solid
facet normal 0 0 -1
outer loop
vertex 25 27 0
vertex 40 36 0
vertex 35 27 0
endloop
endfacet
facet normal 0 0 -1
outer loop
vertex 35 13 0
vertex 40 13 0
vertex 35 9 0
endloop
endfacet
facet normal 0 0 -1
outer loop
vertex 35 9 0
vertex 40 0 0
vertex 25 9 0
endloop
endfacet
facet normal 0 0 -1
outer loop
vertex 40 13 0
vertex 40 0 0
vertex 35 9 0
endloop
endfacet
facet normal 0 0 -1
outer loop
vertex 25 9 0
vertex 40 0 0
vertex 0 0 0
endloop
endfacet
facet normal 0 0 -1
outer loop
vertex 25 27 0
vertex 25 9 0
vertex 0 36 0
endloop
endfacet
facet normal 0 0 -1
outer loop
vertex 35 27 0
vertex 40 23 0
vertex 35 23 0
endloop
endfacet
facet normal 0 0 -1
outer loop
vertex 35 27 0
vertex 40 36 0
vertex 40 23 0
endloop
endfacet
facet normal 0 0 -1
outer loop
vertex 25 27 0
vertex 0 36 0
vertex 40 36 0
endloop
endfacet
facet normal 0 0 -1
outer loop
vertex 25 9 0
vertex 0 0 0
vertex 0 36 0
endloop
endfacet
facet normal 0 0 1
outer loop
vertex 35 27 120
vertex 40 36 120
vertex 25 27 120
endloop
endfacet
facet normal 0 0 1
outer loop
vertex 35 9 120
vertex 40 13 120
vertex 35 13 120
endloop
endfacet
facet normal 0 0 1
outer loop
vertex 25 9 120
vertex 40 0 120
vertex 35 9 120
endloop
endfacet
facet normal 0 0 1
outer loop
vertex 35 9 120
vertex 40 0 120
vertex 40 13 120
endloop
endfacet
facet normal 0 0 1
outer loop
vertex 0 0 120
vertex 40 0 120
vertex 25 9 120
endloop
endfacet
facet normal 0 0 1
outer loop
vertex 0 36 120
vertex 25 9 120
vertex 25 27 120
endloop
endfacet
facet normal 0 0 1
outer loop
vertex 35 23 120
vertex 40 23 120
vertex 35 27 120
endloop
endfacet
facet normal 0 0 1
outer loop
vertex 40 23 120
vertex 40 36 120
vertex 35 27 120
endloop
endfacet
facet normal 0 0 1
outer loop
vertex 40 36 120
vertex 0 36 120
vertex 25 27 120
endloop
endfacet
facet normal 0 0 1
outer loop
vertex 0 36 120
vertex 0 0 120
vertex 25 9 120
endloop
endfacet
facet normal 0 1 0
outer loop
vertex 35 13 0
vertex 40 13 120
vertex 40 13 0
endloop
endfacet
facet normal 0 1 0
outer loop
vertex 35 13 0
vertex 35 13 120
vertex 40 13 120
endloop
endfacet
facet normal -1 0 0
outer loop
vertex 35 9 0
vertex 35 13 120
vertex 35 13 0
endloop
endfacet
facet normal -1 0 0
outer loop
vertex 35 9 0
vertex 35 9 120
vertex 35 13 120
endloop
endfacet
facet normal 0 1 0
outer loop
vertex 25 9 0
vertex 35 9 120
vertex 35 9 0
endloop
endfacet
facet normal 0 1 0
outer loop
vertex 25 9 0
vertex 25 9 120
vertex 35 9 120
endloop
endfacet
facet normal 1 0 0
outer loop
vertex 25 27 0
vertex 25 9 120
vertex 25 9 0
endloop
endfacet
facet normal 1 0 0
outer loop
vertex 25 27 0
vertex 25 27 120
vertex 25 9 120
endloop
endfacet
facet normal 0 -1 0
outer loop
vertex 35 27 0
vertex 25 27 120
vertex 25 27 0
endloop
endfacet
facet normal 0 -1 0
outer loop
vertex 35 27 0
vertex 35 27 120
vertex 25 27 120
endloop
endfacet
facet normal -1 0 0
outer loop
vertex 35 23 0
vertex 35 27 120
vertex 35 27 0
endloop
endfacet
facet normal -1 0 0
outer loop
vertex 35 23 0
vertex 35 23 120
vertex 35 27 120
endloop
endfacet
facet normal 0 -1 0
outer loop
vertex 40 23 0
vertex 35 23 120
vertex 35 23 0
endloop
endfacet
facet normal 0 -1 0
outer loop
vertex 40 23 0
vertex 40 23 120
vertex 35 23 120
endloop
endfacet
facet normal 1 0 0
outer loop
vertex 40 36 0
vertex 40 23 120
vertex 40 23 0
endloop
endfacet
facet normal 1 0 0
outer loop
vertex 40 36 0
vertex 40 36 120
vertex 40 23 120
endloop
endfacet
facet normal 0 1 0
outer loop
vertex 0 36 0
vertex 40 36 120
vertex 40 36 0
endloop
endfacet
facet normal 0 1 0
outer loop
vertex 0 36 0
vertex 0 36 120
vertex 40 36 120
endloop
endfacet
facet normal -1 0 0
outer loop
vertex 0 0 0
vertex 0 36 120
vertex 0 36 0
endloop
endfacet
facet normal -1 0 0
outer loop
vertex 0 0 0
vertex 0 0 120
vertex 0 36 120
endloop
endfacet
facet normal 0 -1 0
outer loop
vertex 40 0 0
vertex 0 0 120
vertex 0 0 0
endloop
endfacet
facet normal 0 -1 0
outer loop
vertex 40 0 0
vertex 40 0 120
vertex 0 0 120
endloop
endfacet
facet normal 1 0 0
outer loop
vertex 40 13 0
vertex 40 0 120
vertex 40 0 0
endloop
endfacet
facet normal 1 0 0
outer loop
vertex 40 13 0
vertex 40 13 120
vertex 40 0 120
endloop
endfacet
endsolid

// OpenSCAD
$fn = 32;

// ----------------------------------------------------------------------
// T-slot rail: 40 x 36 mm section, 120 mm long
// ----------------------------------------------------------------------

// --- parameters (mm) ---
profile_height = 120;     // extrusion height
profile_points = 12;      // points of the closed outline

profile = [[0, 0], [40, 0], [40, 13], [35, 13], [35, 9], [25, 9], [25, 27], [35, 27], [35, 23], [40, 23], [40, 36], [0, 36]];  // single closed polygon, 12 points, counter clockwise

// --- the one profile operation ---
linear_extrude(height = profile_height) polygon(points = profile);
